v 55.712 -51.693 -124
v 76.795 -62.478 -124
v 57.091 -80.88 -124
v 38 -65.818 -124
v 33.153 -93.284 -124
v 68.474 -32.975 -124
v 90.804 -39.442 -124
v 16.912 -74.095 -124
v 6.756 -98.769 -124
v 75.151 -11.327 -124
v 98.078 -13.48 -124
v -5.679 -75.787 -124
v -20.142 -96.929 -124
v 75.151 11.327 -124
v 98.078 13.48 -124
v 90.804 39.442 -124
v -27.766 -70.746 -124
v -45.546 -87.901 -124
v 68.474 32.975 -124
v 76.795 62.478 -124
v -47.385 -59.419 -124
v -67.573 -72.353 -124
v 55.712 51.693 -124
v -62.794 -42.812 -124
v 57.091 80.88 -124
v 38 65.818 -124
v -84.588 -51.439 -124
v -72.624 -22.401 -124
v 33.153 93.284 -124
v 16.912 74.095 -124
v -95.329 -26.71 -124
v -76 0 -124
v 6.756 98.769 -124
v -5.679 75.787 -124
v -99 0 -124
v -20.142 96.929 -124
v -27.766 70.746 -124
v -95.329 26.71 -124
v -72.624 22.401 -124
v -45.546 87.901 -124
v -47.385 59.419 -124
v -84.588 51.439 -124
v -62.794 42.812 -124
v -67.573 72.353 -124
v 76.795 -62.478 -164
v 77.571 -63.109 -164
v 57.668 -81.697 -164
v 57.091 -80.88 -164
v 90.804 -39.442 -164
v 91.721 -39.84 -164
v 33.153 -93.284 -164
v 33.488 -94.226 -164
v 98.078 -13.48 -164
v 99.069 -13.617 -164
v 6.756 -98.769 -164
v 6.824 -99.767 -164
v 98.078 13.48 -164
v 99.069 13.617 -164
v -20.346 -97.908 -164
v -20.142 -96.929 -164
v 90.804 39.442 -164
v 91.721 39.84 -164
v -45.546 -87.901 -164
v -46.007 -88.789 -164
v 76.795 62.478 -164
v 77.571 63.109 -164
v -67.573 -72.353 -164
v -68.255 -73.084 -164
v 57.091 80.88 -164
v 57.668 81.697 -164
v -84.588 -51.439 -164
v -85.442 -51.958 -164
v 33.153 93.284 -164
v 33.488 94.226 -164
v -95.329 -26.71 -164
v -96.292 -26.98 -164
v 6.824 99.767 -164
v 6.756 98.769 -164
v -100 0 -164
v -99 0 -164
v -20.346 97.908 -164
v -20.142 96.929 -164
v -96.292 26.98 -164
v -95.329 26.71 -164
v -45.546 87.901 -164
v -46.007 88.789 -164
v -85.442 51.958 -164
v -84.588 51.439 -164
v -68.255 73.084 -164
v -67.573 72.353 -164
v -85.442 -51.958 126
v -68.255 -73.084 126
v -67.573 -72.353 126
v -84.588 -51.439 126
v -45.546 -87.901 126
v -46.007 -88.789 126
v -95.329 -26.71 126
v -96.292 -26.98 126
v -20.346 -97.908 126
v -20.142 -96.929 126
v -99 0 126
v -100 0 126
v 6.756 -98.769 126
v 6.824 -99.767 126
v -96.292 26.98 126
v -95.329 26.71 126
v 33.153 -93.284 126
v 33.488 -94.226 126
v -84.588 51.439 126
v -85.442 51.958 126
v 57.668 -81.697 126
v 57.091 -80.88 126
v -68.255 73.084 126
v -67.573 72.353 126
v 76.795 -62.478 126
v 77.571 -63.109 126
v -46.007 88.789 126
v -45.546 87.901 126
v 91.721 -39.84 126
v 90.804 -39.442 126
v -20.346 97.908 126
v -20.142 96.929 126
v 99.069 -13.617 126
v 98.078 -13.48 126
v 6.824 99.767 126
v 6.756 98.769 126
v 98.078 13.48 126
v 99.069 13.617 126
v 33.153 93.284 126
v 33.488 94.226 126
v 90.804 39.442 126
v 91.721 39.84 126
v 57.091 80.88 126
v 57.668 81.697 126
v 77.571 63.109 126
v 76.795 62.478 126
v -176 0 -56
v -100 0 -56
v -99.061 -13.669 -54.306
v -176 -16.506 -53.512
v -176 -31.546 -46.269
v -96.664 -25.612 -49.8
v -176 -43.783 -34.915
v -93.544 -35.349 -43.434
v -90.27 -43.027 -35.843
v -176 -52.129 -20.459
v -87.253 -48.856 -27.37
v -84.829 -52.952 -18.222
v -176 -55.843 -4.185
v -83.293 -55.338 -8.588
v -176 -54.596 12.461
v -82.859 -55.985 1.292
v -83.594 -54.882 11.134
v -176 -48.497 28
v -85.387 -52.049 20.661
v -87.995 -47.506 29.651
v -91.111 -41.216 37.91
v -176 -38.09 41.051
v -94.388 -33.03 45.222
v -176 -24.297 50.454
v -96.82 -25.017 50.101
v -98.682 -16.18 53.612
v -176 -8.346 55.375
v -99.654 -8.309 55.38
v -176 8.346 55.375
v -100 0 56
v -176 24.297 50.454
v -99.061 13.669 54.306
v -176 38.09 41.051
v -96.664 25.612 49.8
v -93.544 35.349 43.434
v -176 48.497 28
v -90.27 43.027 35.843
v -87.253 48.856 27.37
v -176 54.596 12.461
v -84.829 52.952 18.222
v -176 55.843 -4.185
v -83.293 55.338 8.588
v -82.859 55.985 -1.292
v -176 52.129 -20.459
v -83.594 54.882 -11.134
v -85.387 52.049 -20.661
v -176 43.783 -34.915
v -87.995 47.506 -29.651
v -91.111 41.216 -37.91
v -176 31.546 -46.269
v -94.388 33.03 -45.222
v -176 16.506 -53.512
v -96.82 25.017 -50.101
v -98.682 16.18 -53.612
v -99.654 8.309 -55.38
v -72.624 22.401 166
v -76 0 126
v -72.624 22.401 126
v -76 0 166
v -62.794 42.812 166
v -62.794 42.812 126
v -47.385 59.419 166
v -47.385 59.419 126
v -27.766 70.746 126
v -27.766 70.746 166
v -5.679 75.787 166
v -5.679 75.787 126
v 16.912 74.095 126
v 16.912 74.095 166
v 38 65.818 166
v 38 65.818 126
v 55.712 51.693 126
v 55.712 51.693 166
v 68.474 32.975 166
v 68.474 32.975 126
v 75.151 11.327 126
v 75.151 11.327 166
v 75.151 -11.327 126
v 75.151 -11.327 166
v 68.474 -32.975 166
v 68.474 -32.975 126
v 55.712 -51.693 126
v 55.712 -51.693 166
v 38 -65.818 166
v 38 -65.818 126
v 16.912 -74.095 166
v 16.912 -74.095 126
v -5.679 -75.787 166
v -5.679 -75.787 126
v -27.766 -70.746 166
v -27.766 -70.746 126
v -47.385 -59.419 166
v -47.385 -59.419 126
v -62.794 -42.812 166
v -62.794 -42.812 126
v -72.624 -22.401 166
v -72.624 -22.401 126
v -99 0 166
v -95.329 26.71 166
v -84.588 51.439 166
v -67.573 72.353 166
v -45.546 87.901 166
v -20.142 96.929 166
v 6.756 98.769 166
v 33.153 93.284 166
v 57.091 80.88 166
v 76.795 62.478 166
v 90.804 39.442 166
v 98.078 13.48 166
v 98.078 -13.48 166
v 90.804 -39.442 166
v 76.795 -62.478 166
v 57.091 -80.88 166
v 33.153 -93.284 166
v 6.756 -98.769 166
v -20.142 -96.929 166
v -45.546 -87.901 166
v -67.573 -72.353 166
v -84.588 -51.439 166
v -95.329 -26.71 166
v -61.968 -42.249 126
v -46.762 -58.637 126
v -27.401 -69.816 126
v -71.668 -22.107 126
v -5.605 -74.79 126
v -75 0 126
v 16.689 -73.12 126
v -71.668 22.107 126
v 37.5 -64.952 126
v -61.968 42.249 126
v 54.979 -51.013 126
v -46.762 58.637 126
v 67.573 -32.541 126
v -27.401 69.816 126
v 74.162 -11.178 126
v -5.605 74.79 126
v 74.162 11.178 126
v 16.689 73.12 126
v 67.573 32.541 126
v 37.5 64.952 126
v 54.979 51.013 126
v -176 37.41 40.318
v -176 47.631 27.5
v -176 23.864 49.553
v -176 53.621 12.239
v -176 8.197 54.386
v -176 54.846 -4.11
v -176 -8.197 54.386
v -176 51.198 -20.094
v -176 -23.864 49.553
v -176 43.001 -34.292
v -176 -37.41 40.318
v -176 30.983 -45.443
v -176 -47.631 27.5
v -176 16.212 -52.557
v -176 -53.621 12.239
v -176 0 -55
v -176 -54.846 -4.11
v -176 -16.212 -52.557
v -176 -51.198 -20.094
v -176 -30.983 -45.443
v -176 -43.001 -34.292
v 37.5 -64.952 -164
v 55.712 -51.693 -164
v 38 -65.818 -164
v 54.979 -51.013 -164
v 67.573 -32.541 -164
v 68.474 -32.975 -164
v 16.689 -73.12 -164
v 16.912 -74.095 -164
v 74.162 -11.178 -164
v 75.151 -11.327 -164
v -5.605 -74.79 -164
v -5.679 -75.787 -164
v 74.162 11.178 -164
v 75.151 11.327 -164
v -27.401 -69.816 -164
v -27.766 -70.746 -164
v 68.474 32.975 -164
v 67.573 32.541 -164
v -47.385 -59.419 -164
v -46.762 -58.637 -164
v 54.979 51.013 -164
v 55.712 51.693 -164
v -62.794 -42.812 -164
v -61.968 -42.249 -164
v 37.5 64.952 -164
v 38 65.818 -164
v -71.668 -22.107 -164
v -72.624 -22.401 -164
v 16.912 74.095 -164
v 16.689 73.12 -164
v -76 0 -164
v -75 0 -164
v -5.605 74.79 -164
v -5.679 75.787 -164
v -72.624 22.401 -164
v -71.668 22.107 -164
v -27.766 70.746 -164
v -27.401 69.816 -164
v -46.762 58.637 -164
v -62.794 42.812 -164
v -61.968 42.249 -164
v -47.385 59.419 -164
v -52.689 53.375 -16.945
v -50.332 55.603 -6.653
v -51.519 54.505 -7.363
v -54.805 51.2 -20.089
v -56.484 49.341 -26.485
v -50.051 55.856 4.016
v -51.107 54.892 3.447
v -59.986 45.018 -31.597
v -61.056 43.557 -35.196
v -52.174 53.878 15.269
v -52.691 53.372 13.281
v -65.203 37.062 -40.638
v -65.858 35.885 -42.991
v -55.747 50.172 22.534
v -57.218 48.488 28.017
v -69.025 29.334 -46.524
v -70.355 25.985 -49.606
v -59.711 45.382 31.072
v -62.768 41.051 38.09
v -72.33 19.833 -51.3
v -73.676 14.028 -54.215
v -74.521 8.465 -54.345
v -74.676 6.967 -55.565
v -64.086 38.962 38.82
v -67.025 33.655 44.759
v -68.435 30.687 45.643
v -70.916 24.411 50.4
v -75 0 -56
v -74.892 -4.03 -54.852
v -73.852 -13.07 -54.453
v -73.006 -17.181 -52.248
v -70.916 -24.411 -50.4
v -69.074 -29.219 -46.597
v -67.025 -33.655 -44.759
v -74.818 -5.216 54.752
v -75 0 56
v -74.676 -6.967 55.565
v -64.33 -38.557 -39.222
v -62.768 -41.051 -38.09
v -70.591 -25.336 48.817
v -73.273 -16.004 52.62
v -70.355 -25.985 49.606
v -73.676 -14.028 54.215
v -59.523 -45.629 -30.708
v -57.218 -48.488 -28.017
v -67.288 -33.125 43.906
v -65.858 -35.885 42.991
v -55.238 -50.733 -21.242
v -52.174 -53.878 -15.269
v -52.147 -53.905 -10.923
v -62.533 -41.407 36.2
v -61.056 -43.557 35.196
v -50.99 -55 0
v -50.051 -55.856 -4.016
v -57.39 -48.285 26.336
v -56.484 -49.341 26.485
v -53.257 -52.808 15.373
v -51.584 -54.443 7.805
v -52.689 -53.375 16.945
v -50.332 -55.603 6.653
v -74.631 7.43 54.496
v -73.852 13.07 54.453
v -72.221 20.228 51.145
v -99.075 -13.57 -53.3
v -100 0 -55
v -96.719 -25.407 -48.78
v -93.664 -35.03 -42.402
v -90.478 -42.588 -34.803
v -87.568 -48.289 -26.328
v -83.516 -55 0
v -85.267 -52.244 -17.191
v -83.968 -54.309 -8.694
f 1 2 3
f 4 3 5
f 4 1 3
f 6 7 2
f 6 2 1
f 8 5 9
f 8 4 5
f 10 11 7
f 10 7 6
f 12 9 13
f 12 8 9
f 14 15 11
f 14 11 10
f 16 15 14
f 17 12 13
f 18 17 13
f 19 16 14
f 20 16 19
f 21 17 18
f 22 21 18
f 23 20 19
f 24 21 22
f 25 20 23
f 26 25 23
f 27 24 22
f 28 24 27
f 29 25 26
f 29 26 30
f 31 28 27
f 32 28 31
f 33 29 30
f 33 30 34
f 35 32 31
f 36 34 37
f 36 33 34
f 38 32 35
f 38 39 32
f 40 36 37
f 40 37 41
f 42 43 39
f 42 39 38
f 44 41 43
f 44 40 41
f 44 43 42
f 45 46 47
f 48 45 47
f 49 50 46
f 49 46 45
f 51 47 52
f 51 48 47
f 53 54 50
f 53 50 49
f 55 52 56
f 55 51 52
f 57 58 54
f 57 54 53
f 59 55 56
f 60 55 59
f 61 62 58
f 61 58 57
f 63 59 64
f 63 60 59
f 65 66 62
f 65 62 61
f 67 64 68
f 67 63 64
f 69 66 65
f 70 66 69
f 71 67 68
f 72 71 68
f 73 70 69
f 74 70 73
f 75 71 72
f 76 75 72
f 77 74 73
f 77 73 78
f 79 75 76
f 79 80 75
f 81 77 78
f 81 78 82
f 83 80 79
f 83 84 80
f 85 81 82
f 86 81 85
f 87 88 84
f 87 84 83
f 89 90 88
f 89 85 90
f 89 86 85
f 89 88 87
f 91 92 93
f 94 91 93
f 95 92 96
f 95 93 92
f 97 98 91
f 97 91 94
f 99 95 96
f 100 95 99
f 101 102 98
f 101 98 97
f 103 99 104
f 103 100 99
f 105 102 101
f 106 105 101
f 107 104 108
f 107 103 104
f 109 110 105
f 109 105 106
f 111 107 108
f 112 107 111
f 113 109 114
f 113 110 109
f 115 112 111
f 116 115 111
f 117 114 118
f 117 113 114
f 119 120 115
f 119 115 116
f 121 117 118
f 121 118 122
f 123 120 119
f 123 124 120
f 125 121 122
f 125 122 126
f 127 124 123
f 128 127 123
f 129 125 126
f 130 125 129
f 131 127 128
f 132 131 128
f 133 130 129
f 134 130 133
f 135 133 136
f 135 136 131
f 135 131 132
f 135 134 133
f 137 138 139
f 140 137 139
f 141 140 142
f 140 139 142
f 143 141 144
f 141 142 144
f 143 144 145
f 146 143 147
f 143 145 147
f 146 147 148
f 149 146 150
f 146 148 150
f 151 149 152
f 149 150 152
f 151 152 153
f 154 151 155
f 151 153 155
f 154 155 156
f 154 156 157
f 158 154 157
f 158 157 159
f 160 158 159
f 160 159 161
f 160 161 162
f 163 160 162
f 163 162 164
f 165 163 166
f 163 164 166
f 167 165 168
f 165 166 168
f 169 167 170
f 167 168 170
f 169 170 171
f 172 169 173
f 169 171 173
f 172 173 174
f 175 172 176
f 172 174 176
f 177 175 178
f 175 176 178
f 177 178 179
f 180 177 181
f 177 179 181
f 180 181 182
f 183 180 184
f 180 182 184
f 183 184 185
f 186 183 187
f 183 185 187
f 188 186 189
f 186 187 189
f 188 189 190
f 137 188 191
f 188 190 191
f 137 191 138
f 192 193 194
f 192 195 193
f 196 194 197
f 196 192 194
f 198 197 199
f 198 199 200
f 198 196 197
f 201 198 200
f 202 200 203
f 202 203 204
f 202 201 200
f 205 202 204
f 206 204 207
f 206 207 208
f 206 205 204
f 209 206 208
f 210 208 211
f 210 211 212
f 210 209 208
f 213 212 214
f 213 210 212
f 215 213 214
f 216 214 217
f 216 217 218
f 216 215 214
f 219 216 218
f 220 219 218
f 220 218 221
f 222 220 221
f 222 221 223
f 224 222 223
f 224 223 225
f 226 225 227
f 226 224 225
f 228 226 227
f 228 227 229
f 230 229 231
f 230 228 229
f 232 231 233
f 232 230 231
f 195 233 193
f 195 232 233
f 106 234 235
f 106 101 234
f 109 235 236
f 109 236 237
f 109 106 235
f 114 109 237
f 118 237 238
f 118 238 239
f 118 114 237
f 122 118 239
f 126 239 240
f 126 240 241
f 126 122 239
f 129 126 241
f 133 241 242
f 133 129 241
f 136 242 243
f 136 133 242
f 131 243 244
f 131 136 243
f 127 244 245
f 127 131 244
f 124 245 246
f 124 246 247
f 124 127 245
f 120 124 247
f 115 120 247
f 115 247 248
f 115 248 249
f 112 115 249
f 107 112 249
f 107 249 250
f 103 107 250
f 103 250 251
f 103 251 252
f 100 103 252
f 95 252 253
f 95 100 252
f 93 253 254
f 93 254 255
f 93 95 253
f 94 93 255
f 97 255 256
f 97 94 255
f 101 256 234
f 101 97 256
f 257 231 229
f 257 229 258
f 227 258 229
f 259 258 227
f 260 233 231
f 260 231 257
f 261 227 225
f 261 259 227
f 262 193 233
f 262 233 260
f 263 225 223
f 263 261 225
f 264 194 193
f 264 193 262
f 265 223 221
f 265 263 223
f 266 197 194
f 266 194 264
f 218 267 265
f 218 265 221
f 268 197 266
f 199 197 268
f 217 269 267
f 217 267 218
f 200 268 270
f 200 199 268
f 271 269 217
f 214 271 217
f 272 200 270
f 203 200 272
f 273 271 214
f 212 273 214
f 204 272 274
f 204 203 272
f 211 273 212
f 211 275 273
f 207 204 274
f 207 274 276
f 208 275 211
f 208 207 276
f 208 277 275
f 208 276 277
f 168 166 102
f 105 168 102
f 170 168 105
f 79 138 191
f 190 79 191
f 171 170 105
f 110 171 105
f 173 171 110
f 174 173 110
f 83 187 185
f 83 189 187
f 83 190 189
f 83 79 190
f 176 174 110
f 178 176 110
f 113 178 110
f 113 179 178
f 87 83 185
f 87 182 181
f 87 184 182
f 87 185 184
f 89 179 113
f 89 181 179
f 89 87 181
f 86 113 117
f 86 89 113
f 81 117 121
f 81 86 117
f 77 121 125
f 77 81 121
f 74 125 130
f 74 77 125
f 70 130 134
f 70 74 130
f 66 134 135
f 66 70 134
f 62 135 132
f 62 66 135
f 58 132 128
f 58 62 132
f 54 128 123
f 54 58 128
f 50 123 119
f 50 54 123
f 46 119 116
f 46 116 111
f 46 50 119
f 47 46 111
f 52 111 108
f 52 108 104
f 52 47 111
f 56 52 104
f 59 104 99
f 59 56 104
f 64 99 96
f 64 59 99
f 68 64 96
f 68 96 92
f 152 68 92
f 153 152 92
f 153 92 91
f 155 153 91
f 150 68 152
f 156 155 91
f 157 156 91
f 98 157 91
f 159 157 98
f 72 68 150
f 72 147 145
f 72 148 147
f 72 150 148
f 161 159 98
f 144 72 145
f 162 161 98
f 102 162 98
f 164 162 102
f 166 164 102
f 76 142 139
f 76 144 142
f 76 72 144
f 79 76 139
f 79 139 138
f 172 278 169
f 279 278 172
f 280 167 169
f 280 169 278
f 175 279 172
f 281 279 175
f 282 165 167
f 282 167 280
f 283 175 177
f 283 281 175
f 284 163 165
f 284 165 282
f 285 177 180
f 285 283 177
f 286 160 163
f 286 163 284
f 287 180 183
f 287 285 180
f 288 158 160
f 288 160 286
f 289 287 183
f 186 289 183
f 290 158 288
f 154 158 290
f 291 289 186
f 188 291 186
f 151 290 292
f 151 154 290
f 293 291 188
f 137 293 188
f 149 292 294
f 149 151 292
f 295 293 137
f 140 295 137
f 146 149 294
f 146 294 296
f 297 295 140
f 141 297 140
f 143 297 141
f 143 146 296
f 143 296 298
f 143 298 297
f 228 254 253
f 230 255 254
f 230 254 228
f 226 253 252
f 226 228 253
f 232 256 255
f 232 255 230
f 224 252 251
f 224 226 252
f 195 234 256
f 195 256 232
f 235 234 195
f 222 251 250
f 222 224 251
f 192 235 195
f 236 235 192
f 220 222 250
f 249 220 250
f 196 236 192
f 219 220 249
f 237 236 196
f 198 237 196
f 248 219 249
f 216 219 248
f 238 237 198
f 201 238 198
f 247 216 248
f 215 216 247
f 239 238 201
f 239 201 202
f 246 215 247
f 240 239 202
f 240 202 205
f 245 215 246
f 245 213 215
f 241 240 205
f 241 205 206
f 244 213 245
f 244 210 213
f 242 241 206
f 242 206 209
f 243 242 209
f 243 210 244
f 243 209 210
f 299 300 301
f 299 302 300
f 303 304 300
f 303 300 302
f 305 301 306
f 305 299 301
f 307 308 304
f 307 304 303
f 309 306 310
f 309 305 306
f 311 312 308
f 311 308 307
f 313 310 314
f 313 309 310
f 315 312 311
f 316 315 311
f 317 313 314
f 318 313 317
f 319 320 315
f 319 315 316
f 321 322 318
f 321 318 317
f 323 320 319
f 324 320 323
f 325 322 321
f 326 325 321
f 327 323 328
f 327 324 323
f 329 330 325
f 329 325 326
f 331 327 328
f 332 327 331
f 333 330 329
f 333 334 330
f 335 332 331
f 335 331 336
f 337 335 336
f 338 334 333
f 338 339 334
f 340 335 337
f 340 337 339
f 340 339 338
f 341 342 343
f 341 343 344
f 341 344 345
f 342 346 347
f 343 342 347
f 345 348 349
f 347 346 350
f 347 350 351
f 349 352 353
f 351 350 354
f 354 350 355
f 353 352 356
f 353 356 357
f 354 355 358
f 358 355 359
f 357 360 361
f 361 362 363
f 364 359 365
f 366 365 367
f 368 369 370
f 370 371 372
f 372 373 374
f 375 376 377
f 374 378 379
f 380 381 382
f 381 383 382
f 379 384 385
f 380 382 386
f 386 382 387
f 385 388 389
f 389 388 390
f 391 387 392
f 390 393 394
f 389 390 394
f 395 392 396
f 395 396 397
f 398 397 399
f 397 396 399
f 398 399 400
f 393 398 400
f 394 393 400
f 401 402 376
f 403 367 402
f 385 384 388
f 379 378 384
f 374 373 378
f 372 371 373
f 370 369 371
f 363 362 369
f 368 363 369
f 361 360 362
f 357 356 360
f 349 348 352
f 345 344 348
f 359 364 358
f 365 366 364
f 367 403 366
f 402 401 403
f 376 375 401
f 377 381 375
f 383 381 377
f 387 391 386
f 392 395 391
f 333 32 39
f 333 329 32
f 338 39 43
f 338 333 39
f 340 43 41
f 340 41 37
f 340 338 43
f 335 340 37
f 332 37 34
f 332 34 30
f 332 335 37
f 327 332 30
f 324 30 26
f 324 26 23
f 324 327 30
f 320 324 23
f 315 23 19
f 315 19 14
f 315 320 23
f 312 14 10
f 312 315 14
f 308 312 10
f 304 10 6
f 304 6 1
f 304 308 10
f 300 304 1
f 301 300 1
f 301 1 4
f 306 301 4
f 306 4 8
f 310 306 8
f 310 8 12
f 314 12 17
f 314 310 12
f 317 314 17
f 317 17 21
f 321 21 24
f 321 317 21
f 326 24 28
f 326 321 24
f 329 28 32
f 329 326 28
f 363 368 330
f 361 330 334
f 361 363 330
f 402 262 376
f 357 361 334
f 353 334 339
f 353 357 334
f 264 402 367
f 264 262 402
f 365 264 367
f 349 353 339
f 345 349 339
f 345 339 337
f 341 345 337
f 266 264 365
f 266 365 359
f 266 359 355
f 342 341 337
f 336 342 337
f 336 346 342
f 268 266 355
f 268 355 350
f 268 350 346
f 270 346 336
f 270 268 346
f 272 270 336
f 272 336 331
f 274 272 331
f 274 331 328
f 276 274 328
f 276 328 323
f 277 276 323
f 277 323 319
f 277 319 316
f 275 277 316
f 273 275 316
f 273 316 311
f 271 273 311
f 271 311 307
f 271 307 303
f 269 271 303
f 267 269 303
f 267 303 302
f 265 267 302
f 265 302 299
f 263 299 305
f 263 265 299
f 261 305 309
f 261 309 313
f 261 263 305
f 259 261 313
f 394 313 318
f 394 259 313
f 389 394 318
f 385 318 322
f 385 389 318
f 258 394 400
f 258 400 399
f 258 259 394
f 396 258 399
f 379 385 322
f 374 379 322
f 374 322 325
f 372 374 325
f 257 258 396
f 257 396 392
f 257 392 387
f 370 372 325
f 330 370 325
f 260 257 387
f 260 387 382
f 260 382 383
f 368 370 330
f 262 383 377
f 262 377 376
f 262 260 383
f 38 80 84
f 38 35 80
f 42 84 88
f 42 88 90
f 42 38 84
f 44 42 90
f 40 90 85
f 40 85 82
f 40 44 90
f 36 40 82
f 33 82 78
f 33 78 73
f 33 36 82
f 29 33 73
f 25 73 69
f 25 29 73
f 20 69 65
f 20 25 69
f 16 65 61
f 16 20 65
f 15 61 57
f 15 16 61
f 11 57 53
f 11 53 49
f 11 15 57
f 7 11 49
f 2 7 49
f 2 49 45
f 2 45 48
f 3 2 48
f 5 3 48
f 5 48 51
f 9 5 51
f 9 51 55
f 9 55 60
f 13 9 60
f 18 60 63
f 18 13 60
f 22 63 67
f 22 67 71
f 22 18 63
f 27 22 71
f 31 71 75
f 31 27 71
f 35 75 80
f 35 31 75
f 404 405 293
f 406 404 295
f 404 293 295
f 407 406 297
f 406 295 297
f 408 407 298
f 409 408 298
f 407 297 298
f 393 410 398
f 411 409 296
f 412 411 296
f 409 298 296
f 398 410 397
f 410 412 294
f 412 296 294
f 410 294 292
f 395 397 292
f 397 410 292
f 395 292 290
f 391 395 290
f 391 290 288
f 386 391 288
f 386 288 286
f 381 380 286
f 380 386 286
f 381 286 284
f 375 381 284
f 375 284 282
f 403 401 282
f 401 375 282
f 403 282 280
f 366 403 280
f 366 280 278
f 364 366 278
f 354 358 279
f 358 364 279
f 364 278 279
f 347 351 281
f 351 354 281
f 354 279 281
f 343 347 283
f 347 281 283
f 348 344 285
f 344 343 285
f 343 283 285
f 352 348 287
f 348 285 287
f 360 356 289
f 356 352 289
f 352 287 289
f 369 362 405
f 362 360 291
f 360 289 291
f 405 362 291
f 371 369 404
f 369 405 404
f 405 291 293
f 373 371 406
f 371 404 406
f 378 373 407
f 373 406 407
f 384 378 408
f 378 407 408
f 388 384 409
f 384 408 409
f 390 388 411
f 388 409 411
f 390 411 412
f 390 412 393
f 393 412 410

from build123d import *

# Parameters (mm, degrees)
F0_W     = 25
F0_H     = 1
F0_W_2   = 76
F0_W_3   = 75
F3_R     = 55
F4_DEPTH = 176
F5_R     = 75
F6_DEPTH = 1200


# Not quite as in the source:
# - a feature names something its author has since deleted; it is built from what else it names


with BuildPart() as f1:
    # F0 (on Front) → F1 (revolve)
    with BuildSketch(Plane.XZ):
        Polygon((-100, -55), (-75, -55), (-75, 126), (-76, 126), (-76, 166), (-99, 166), (-99, 126), (-100, 126), align=None)
        with Locations((-87.5, -55.5)):
            Rectangle(F0_W, F0_H)
        Polygon((-76, -164), (-75, -164), (-75, -56), (-100, -56), (-100, -164), (-99, -164), (-99, -124), (-76, -124), align=None)
    revolve(axis=Axis((0, 0, -35.4669196472), (0, 0, -1)))

    # F0 (on Front) → F2 (revolve)
    with BuildSketch(Plane.XZ):
        with Locations((-138, -55.5)):
            Rectangle(F0_W_2, F0_H)
        with Locations((-87.5, -55.5)):
            Rectangle(F0_W, F0_H)
        with Locations((-37.5, -55.5)):
            Rectangle(F0_W_3, F0_H)
    revolve(axis=Axis((-175, 0, 0), (-1, 0, 0)))

    # F3 (on face) → F4 (cut, through all)
    with BuildSketch(Plane(origin=(-176, 0, 0), x_dir=(0, -1, 0), z_dir=(-1, 0, 0))):
        Circle(F3_R)
    extrude(amount=-F4_DEPTH, mode=Mode.SUBTRACT)

    # F5 (on face) → F6 (cut)
    with BuildSketch(Plane.XY.offset(166)):
        Circle(F5_R)
    extrude(amount=-F6_DEPTH, mode=Mode.SUBTRACT)


solid = f1.part
